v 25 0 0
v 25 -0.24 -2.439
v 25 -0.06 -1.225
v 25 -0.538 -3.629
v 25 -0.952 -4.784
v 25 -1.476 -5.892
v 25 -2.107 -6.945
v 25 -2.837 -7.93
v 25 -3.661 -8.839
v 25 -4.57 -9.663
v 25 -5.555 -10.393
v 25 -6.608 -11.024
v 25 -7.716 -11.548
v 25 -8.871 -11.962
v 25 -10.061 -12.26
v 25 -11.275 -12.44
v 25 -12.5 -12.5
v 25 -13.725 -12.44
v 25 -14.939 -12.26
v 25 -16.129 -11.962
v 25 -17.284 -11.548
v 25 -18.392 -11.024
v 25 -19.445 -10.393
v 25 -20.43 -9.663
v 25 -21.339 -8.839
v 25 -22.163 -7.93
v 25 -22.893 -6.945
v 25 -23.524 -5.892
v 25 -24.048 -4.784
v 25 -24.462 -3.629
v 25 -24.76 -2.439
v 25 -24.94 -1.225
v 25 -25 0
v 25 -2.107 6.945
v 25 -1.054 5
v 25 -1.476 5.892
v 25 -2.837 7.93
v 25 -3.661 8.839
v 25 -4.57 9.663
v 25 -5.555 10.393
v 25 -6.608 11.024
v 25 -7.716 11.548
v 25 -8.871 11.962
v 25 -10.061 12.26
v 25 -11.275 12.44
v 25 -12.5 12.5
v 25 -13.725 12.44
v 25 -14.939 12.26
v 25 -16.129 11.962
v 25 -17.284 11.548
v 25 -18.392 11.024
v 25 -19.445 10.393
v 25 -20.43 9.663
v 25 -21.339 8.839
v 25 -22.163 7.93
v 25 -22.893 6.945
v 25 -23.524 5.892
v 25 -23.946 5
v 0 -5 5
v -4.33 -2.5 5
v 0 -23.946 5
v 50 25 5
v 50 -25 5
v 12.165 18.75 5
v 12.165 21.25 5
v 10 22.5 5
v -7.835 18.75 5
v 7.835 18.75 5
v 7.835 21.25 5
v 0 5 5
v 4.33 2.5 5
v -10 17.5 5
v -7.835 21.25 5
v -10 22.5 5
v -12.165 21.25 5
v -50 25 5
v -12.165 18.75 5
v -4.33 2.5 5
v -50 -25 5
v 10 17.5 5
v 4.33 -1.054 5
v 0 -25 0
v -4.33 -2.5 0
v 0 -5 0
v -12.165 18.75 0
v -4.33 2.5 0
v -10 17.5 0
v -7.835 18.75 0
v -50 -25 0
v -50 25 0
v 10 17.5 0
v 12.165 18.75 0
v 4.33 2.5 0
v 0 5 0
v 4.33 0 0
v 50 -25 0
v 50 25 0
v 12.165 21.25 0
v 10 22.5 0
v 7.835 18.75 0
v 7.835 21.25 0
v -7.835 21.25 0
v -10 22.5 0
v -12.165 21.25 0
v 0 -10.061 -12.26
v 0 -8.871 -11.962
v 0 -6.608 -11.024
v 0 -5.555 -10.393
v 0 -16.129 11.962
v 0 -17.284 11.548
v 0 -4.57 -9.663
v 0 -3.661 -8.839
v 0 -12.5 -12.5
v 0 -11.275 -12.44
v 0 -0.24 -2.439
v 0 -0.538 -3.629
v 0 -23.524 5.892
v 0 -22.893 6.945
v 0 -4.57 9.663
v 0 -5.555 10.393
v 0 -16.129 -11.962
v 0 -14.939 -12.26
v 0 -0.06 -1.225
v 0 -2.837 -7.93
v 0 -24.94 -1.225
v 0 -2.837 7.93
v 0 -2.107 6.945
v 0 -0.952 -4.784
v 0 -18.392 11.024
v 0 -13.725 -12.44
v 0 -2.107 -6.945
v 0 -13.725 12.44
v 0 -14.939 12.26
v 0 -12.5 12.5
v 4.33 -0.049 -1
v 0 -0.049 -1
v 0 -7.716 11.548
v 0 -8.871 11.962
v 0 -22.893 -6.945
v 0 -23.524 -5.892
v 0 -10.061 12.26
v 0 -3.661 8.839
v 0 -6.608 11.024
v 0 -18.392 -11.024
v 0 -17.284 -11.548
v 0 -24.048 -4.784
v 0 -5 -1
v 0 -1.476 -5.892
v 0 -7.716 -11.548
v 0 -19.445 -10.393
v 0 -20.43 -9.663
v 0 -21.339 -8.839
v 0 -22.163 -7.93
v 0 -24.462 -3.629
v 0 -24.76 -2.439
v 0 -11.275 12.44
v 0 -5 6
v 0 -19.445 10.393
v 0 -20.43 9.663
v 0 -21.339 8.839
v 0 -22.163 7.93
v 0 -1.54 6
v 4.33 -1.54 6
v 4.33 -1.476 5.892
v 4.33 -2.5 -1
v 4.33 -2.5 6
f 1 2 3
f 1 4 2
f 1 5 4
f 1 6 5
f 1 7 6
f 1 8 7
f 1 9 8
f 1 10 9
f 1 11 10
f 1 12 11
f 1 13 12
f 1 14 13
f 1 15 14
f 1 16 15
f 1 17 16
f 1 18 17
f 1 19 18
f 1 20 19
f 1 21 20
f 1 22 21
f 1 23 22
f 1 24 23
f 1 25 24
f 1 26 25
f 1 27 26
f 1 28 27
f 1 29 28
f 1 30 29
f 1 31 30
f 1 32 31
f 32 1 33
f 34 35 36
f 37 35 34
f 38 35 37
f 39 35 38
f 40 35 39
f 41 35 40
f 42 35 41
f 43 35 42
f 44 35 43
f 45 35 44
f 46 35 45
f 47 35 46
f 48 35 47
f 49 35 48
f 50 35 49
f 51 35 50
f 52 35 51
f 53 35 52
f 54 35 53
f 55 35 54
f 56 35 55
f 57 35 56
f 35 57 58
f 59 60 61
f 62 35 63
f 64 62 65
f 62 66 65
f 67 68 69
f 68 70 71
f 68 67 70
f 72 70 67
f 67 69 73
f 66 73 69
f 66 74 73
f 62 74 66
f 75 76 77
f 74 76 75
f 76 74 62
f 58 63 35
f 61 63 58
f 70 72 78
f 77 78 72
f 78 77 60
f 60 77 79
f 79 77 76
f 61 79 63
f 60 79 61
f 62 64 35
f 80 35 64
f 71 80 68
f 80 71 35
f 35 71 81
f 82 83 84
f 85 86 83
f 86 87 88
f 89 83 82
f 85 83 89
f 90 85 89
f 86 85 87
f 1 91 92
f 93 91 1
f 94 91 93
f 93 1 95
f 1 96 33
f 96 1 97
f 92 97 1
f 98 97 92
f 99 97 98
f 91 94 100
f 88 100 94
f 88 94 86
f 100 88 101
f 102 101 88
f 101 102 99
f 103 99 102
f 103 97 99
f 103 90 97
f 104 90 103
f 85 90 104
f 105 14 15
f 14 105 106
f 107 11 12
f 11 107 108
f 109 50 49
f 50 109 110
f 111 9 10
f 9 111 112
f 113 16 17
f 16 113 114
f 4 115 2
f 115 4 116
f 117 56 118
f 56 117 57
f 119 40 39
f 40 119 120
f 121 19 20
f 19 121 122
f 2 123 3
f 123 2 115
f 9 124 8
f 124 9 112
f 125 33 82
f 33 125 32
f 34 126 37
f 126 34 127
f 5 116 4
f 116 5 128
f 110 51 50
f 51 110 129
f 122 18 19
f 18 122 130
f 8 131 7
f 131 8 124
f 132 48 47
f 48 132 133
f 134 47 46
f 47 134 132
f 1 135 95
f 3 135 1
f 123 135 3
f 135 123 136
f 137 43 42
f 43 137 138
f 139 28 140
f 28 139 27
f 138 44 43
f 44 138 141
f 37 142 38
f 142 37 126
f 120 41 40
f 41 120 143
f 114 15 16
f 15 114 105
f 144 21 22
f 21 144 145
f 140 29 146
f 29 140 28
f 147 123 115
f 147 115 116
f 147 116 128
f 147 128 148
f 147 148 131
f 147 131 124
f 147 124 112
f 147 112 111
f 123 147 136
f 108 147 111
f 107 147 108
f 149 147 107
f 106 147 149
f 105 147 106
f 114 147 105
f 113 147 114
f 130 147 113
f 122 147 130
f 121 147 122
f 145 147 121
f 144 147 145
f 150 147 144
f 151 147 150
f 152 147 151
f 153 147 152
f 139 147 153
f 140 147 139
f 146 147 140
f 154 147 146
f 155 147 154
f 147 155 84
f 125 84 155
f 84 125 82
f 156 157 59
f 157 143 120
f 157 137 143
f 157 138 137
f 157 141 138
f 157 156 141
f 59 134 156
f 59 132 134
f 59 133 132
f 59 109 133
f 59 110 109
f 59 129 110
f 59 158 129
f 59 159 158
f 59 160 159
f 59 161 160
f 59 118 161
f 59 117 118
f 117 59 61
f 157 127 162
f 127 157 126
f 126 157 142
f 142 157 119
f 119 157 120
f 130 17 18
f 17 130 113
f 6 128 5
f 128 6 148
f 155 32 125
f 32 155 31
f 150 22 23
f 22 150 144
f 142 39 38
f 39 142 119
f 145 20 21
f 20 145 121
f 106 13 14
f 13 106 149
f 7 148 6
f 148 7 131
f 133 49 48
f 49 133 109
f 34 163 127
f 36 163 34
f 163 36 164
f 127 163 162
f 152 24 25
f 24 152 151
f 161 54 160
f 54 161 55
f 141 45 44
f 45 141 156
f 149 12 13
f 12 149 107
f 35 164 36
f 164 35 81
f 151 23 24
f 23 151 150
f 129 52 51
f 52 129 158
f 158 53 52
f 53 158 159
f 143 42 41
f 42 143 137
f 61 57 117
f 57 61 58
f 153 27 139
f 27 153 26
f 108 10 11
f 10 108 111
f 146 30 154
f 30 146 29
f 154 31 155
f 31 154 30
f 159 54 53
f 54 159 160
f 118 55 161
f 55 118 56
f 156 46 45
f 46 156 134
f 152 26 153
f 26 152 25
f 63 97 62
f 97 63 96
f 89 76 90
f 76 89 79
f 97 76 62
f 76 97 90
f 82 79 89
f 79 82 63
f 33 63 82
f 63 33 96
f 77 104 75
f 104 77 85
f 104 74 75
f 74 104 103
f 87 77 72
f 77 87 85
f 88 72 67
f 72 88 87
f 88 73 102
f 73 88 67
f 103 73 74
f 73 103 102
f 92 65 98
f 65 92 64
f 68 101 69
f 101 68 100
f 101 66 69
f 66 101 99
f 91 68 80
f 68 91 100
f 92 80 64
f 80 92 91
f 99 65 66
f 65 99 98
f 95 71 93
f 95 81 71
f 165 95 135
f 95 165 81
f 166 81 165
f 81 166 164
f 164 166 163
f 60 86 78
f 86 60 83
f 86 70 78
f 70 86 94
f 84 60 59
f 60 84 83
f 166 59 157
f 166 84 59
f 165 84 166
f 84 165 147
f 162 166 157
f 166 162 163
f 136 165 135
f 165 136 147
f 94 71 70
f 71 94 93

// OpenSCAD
module hex_hole(size, height) {
    rotate([0, 0, 90])
    cylinder(r=size, h=height, $fn=6);
}

module stepped_mounting_plate() {
    difference() {
        union() {
            // Main rectangular body
            translate([-50, -25, 0])
            cube([100, 50, 5]);
            
            // Narrower tongue with rounded tip
            translate([-25, -12.5, 0])
            union() {
                cube([50, 25, 5]);
                translate([25, 0, 0])
                rotate([0, 90, 0])
                cylinder(r=12.5, h=25, $fn=64);
            }
        }
        
        // Larger hex hole on the rectangular section
        translate([0, 0, -1])
        hex_hole(5, 7);
        
        // Four smaller hex holes in a 2x2 pattern near the rounded end
        for (x = [-10, 10])
            for (y = [-5, 5])
                translate([x, y + 25, -1])
                hex_hole(2.5, 7);
    }
}

stepped_mounting_plate();
